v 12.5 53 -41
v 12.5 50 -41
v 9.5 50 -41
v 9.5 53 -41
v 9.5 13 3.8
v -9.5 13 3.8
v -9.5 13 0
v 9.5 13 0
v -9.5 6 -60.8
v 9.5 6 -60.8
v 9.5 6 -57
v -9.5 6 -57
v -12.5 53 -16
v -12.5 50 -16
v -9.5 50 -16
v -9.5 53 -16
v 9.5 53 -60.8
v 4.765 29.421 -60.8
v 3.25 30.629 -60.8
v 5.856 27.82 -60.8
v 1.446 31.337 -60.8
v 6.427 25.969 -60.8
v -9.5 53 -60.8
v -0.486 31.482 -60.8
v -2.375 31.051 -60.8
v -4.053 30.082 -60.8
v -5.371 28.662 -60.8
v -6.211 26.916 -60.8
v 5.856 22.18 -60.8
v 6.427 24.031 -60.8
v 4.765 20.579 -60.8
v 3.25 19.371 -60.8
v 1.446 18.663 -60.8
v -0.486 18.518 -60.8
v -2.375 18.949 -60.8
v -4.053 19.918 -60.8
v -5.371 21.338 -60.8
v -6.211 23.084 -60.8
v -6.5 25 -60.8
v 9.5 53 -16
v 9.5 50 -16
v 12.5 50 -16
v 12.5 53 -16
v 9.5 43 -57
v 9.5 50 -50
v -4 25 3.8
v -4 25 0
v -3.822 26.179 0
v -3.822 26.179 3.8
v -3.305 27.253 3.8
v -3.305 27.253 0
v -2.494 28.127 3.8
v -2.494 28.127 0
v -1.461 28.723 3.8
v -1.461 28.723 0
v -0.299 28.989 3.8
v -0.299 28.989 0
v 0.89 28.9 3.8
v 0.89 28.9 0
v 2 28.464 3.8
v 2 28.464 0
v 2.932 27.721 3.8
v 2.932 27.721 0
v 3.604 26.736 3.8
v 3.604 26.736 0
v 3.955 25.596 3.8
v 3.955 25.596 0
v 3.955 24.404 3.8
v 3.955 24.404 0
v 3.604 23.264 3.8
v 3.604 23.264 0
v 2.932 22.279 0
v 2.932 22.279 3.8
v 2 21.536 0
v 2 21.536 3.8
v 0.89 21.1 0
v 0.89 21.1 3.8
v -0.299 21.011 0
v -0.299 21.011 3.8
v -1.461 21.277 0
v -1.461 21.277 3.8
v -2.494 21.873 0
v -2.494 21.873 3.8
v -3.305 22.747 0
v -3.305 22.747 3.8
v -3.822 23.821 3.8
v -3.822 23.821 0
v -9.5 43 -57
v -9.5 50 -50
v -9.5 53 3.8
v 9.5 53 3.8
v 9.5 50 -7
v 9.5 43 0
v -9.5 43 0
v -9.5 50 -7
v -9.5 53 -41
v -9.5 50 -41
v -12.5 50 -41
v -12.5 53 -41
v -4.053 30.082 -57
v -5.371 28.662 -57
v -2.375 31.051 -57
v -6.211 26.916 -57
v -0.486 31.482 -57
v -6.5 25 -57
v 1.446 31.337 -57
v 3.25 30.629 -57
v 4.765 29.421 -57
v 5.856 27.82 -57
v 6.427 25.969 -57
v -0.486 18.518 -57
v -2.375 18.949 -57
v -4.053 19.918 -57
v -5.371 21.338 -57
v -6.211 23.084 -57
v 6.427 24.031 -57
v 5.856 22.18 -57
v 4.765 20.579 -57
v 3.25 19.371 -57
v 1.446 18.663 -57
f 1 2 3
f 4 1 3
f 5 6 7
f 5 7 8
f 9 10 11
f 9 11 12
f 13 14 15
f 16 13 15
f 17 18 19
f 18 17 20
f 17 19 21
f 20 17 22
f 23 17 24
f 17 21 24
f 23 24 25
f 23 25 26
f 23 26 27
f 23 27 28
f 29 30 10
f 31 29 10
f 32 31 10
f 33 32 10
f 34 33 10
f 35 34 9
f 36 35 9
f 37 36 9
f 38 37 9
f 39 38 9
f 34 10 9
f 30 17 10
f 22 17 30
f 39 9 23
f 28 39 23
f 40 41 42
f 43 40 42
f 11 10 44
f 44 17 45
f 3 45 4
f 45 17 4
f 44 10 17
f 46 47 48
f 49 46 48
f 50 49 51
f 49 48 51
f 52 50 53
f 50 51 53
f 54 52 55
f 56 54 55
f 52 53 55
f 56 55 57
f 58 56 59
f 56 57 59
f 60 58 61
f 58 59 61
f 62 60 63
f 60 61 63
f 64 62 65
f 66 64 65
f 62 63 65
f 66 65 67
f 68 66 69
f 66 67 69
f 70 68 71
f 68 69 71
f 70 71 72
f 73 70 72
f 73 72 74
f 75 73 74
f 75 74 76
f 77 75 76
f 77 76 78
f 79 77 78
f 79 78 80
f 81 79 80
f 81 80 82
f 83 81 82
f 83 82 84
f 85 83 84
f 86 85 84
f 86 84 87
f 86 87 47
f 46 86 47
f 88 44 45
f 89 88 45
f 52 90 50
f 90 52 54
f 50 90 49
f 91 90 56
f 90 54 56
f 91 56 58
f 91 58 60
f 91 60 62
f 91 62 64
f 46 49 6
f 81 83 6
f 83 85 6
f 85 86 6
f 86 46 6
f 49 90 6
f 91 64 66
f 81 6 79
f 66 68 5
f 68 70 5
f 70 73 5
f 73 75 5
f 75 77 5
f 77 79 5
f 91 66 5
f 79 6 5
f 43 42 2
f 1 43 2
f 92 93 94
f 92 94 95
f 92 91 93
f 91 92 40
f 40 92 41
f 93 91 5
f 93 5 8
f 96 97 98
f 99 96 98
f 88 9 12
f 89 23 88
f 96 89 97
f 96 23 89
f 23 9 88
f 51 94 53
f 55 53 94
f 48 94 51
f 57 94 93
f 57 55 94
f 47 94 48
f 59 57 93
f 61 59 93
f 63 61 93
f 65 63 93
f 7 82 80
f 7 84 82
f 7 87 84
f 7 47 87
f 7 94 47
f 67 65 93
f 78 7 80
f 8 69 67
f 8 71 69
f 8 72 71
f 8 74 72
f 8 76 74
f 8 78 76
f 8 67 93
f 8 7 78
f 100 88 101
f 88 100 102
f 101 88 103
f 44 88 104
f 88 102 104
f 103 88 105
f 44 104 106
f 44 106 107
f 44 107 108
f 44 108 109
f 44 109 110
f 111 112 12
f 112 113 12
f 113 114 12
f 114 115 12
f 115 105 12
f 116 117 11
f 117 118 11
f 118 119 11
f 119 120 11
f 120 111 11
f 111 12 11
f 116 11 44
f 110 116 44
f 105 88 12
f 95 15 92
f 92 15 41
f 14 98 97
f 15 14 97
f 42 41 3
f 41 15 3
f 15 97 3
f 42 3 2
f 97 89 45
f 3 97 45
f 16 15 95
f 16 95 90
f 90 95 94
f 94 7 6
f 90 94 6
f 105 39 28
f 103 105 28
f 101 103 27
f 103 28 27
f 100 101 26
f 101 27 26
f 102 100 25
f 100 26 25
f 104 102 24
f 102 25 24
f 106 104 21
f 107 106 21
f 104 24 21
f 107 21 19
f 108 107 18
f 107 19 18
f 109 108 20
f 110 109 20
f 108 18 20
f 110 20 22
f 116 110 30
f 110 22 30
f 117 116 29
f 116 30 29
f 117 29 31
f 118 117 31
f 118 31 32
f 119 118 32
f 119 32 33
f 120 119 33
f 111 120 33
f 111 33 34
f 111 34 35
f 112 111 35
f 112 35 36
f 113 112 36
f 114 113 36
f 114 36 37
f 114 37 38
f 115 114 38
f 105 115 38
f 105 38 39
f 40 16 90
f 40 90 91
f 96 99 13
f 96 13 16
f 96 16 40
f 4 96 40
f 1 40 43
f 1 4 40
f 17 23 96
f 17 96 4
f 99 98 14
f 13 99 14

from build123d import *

# Parameters (mm, degrees)
IZIM1_W                       = 19
IZIM1_H                       = 3.8
Y_KSEKLIK_EKSTR_ZYON1_DEPTH   = 50
Y_KSEKLIK_EKSTR_ZYON1_2_DEPTH = 50
Y_KSEKLIK_EKSTR_ZYON2_DEPTH   = 3
IZIM3_R                       = 6.5
KES_EKSTR_ZYON1_DEPTH         = 5
IZIM4_R                       = 4
KES_EKSTR_ZYON2_DEPTH         = 5
IZIM5_W                       = 19
IZIM5_H                       = 6
KES_EKSTR_ZYON3_DEPTH         = 73
IZIM6_W                       = 19
IZIM6_H                       = 7
KES_EKSTR_ZYON4_DEPTH         = 9
Y_KSEKLIK_EKSTR_ZYON3_DEPTH   = 19


with BuildPart() as part:
    # Çizim1 → Yükseklik-Ekstrüzyon1 (new body)
    with BuildSketch(Plane(origin=(0, 0, 0), x_dir=(1, 0, 0), z_dir=(0, 1, 0))):
        with Locations((0, 58.9)):
            Rectangle(IZIM1_W, IZIM1_H)
    extrude(amount=Y_KSEKLIK_EKSTR_ZYON1_DEPTH)



with BuildPart() as body_2:
    # Çizim1 → Y_kseklik-Ekstr_zyon1 2 (new body)
    with BuildSketch(Plane(origin=(0, 0, 0), x_dir=(1, 0, 0), z_dir=(0, 1, 0))):
        with Locations((0, -1.9)):
            Rectangle(IZIM1_W, IZIM1_H)
    extrude(amount=Y_KSEKLIK_EKSTR_ZYON1_2_DEPTH)


with BuildPart() as part_1:
    add(part.part)

    add(body_2.part)  # Yükseklik-Ekstrüzyon2 merges body 2
    # Çizim2 → Yükseklik-Ekstrüzyon2 (add)
    with BuildSketch(Plane(origin=(0, 50, 0), x_dir=(1, 0, 0), z_dir=(0, 1, 0))):
        Polygon((-9.5, 60.8), (-9.5, 41), (-12.5, 41), (-12.5, 16), (-9.5, 16), (-9.5, -3.8), (9.5, -3.8), (9.5, 16), (12.5, 16), (12.5, 41), (9.5, 41), (9.5, 60.8), align=None)
    extrude(amount=Y_KSEKLIK_EKSTR_ZYON2_DEPTH)

    # Çizim3 → Kes-Ekstrüzyon1 (cut)
    with BuildSketch(Plane(origin=(0, 0, -60.8), x_dir=(-1, 0, 0), z_dir=(0, 0, -1))):
        with Locations((0, 25)):
            Circle(IZIM3_R)
    extrude(amount=-KES_EKSTR_ZYON1_DEPTH, mode=Mode.SUBTRACT)

    # Çizim4 → Kes-Ekstrüzyon2 (cut)
    with BuildSketch(Plane(origin=(0, 0, 0), x_dir=(-1, 0, 0), z_dir=(0, 0, -1))):
        with Locations((0, 25)):
            Circle(IZIM4_R)
    extrude(amount=-KES_EKSTR_ZYON2_DEPTH, mode=Mode.SUBTRACT)

    # Çizim5 → Kes-Ekstrüzyon3 (cut)
    with BuildSketch(Plane(origin=(0, 0, -60.8), x_dir=(-1, 0, 0), z_dir=(0, 0, -1))):
        with Locations((0, 3)):
            Rectangle(IZIM5_W, IZIM5_H)
    extrude(amount=-KES_EKSTR_ZYON3_DEPTH, mode=Mode.SUBTRACT)

    # Çizim6 → Kes-Ekstrüzyon4 (cut)
    with BuildSketch(Plane.XY.offset(3.8)):
        with Locations((0, 9.5)):
            Rectangle(IZIM6_W, IZIM6_H)
    extrude(amount=-KES_EKSTR_ZYON4_DEPTH, mode=Mode.SUBTRACT)

    # Çizim7 → Yükseklik-Ekstrüzyon3 (add)
    with BuildSketch(Plane(origin=(9.5, 0, 0), x_dir=(0, 0, -1), z_dir=(1, 0, 0))):
        Polygon((57, 50), (57, 43), (50, 50), align=None)
        Polygon((0, 50), (0, 43), (7, 50), align=None)
    extrude(amount=-Y_KSEKLIK_EKSTR_ZYON3_DEPTH)


solid = part_1.part
